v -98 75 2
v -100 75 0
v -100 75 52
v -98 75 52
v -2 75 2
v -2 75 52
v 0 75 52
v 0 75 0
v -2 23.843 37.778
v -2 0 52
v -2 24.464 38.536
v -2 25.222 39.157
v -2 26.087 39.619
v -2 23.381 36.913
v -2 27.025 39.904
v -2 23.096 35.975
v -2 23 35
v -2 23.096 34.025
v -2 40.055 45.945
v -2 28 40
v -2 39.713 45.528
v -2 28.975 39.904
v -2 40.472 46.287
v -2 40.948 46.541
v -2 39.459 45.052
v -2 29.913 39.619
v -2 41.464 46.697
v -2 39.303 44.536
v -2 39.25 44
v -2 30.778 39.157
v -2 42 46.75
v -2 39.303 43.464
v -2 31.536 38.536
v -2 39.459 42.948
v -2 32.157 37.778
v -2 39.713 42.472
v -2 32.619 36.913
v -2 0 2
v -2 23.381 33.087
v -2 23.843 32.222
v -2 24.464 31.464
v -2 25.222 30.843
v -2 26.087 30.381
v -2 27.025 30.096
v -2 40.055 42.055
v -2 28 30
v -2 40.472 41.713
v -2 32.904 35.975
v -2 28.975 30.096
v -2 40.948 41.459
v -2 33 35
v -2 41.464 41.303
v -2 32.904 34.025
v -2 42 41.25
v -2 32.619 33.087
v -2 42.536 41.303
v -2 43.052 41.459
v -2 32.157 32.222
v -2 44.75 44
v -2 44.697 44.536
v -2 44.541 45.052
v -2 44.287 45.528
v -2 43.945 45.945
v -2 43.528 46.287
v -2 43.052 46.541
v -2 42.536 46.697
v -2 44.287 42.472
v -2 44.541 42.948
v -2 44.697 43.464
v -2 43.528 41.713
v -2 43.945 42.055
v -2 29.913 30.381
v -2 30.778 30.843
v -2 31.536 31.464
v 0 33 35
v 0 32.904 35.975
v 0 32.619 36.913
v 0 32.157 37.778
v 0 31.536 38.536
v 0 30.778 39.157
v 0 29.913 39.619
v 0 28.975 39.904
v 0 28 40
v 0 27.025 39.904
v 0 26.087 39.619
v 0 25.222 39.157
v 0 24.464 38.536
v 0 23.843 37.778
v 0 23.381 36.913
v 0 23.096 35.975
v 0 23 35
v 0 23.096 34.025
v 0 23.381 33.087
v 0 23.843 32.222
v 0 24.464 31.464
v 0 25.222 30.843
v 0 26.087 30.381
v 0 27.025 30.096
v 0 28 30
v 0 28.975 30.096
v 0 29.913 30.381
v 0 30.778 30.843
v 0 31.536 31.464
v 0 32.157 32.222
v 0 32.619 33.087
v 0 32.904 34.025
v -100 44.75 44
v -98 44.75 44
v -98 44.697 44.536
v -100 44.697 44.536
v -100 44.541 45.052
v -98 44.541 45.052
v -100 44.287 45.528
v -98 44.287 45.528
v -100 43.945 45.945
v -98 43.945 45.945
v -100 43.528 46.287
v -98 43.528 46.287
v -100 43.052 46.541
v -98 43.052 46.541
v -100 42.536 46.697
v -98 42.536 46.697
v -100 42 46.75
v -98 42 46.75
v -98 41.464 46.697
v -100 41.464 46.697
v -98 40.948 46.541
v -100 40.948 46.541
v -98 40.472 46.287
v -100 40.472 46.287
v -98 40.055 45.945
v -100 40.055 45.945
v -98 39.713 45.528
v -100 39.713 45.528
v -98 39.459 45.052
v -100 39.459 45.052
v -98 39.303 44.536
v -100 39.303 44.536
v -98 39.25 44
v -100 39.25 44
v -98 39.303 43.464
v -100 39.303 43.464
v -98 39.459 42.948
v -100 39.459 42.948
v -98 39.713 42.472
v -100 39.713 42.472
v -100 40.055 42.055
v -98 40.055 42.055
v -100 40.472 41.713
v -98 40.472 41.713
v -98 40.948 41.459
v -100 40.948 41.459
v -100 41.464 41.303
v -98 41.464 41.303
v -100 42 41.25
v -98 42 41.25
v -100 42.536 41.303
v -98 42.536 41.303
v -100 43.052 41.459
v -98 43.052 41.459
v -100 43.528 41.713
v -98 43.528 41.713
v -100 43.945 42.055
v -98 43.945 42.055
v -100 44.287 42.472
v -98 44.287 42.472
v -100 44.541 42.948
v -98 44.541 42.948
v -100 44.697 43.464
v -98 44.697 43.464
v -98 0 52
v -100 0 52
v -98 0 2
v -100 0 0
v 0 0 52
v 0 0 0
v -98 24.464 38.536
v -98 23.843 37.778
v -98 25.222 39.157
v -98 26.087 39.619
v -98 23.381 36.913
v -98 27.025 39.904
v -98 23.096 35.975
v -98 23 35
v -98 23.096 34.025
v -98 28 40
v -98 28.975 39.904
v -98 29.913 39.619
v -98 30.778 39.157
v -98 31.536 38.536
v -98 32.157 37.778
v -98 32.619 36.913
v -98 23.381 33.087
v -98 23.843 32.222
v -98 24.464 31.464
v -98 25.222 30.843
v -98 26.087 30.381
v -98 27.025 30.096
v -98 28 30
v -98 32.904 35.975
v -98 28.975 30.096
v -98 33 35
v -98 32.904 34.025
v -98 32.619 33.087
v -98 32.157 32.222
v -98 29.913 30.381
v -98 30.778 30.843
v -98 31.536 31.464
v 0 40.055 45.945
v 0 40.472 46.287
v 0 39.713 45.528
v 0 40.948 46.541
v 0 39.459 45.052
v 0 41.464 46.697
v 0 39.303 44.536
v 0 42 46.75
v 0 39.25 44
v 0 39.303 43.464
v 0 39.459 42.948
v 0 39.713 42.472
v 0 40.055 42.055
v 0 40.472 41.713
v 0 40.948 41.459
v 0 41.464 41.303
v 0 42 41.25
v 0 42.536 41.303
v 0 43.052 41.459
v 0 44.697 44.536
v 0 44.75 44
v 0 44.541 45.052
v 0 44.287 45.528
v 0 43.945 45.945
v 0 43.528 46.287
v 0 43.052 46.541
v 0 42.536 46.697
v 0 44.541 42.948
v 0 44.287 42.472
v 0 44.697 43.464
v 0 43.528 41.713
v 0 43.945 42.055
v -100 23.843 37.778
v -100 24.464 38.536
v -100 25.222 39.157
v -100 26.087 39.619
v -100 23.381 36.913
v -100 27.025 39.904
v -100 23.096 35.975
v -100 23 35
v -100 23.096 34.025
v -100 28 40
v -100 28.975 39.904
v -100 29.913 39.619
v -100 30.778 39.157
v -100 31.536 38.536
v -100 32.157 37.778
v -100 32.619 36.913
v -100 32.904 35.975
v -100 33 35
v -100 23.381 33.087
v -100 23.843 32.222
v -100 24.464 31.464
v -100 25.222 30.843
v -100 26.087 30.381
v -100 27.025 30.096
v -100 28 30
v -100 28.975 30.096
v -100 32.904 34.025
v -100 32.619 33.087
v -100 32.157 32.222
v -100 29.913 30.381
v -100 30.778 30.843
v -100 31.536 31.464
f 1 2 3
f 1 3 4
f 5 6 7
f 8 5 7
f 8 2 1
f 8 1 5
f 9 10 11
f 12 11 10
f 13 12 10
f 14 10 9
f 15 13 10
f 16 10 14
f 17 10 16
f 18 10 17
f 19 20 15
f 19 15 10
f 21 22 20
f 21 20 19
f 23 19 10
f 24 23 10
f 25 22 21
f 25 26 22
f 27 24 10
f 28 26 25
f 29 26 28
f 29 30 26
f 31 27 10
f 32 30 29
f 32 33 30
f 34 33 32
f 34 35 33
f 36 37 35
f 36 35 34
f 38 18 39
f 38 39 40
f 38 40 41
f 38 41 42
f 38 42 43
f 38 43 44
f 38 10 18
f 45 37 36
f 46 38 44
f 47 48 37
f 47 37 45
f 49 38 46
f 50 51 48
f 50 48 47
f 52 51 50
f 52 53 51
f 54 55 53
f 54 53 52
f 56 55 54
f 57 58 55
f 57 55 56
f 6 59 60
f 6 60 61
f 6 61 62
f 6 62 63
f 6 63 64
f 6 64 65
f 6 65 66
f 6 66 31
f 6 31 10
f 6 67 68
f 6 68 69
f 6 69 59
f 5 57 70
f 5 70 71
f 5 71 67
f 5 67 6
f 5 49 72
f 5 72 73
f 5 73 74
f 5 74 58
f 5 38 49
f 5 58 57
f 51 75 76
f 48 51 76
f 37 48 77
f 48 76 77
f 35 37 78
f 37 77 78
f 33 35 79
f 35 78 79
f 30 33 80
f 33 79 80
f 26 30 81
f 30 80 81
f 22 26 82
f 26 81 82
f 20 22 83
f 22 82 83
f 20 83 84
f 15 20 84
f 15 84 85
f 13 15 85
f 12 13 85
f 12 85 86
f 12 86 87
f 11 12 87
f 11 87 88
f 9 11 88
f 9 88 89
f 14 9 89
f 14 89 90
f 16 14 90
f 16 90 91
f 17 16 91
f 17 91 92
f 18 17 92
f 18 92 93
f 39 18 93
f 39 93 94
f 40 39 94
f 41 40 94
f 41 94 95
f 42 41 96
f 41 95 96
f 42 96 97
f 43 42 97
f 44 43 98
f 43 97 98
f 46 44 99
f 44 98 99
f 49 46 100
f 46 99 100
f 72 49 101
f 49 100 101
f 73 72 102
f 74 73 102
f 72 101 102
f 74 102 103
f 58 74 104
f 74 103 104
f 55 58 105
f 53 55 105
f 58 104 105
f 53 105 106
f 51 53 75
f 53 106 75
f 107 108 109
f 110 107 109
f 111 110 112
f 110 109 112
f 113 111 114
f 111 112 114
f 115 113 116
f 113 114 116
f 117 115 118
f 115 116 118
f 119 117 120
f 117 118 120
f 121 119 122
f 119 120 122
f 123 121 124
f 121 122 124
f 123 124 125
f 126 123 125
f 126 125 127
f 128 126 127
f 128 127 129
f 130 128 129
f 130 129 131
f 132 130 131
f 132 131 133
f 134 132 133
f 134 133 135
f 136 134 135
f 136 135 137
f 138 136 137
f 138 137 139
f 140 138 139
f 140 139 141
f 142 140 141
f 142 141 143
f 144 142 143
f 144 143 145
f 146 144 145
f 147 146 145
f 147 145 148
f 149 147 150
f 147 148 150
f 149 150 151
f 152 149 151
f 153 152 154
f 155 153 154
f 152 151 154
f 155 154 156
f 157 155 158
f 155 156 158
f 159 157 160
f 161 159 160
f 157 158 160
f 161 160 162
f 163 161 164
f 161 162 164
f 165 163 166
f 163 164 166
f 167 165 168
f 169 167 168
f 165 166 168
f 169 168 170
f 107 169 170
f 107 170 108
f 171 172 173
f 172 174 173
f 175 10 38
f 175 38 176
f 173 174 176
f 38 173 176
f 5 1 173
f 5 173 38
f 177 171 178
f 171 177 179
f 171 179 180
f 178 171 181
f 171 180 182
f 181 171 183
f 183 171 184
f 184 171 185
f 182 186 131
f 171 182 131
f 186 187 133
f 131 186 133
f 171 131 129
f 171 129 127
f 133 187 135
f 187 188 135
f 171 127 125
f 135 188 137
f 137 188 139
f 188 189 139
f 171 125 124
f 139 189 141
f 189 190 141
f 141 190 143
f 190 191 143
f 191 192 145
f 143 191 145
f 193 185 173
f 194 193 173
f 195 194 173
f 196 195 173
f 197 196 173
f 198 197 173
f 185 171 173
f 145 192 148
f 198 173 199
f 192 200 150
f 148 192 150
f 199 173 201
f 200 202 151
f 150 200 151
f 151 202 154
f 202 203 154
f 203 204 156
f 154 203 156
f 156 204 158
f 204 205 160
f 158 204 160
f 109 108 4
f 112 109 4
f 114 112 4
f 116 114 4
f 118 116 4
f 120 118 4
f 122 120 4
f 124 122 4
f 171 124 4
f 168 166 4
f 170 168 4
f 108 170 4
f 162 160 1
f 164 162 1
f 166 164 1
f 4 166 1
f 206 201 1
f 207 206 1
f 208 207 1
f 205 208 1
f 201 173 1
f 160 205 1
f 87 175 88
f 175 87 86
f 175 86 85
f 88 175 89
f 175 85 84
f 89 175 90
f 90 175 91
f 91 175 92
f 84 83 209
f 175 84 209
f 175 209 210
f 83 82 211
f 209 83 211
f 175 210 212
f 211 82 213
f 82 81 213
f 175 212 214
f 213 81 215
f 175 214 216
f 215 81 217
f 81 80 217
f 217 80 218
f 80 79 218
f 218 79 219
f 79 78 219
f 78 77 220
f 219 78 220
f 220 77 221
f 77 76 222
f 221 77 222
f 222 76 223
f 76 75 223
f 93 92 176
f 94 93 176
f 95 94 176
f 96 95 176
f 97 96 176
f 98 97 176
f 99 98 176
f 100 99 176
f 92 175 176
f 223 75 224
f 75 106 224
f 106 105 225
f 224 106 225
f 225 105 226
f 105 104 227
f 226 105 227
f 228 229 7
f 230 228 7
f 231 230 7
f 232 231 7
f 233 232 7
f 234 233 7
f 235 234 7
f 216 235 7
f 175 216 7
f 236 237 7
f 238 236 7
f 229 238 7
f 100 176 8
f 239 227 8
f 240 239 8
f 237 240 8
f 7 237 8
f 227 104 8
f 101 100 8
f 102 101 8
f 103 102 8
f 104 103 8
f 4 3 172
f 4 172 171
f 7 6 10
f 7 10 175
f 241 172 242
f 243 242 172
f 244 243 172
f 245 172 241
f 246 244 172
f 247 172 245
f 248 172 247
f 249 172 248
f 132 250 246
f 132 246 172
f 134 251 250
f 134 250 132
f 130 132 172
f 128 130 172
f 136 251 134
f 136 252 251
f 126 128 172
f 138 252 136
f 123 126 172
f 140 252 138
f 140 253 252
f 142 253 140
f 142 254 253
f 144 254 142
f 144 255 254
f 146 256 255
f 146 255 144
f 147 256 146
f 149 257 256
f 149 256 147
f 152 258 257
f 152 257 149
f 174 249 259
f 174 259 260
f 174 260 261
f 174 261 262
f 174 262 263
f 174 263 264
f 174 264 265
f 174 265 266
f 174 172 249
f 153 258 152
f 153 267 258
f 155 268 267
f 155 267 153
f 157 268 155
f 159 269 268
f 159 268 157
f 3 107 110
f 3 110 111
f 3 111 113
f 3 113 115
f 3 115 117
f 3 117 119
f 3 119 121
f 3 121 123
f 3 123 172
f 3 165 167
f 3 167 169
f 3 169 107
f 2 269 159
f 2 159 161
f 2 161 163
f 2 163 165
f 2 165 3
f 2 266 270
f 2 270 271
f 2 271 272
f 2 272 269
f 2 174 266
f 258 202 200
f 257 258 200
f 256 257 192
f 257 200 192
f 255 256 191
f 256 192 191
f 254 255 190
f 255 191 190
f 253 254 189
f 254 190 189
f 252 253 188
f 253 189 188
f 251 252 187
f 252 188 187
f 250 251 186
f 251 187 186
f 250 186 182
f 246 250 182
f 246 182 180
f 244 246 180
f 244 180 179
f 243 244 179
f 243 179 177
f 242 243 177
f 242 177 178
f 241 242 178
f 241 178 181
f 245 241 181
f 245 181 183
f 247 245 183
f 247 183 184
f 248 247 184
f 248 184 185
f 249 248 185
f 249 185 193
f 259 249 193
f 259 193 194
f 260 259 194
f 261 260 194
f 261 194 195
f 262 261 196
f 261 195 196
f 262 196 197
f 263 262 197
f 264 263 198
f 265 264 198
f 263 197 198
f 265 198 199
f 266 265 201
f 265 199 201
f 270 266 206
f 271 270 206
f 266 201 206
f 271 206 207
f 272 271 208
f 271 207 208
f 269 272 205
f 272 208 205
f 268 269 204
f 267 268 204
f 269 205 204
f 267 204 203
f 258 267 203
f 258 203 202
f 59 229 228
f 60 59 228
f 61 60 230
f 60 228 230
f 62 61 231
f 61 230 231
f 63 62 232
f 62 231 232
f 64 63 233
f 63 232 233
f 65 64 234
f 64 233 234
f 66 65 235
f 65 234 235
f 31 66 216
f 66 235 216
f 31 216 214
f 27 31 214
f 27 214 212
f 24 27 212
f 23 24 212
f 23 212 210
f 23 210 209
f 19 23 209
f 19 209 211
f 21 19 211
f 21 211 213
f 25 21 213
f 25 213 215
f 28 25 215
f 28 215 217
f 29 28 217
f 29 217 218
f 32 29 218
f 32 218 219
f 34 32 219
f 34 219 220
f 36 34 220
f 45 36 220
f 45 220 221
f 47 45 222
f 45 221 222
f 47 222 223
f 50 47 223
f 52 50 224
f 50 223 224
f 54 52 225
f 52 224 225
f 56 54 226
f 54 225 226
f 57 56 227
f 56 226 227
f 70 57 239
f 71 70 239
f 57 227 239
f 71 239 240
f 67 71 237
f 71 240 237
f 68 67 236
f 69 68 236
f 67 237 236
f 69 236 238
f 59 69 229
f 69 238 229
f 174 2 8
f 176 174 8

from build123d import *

# Parameters (mm, degrees)
F0_W     = 100
F0_H     = 75
F1_DEPTH = 2
F2_W     = 2
F2_H     = 75
F3_DEPTH = 50
F4_R     = 5
F4_R_2   = 2.75
F5_DEPTH = 100


with BuildPart() as f1:
    # F0 (on Top) → F1 (new body)
    with BuildSketch(Plane.XY):
        with Locations((-50, 37.5)):
            Rectangle(F0_W, F0_H)
    extrude(amount=F1_DEPTH)

    # F2 (on face) → F3 (join)
    with BuildSketch(Plane.XY.offset(2)):
        with Locations((-99, 37.5)):
            Rectangle(F2_W, F2_H)
        with Locations((-1, 37.5)):
            Rectangle(F2_W, F2_H)
    extrude(amount=F3_DEPTH)

    # F4 (on face) → F5 (cut)
    with BuildSketch(Plane.YZ):
        with Locations((28, 35)):
            Circle(F4_R)
        with Locations((42, 44)):
            Circle(F4_R_2)
    extrude(amount=-F5_DEPTH, mode=Mode.SUBTRACT)


solid = f1.part
